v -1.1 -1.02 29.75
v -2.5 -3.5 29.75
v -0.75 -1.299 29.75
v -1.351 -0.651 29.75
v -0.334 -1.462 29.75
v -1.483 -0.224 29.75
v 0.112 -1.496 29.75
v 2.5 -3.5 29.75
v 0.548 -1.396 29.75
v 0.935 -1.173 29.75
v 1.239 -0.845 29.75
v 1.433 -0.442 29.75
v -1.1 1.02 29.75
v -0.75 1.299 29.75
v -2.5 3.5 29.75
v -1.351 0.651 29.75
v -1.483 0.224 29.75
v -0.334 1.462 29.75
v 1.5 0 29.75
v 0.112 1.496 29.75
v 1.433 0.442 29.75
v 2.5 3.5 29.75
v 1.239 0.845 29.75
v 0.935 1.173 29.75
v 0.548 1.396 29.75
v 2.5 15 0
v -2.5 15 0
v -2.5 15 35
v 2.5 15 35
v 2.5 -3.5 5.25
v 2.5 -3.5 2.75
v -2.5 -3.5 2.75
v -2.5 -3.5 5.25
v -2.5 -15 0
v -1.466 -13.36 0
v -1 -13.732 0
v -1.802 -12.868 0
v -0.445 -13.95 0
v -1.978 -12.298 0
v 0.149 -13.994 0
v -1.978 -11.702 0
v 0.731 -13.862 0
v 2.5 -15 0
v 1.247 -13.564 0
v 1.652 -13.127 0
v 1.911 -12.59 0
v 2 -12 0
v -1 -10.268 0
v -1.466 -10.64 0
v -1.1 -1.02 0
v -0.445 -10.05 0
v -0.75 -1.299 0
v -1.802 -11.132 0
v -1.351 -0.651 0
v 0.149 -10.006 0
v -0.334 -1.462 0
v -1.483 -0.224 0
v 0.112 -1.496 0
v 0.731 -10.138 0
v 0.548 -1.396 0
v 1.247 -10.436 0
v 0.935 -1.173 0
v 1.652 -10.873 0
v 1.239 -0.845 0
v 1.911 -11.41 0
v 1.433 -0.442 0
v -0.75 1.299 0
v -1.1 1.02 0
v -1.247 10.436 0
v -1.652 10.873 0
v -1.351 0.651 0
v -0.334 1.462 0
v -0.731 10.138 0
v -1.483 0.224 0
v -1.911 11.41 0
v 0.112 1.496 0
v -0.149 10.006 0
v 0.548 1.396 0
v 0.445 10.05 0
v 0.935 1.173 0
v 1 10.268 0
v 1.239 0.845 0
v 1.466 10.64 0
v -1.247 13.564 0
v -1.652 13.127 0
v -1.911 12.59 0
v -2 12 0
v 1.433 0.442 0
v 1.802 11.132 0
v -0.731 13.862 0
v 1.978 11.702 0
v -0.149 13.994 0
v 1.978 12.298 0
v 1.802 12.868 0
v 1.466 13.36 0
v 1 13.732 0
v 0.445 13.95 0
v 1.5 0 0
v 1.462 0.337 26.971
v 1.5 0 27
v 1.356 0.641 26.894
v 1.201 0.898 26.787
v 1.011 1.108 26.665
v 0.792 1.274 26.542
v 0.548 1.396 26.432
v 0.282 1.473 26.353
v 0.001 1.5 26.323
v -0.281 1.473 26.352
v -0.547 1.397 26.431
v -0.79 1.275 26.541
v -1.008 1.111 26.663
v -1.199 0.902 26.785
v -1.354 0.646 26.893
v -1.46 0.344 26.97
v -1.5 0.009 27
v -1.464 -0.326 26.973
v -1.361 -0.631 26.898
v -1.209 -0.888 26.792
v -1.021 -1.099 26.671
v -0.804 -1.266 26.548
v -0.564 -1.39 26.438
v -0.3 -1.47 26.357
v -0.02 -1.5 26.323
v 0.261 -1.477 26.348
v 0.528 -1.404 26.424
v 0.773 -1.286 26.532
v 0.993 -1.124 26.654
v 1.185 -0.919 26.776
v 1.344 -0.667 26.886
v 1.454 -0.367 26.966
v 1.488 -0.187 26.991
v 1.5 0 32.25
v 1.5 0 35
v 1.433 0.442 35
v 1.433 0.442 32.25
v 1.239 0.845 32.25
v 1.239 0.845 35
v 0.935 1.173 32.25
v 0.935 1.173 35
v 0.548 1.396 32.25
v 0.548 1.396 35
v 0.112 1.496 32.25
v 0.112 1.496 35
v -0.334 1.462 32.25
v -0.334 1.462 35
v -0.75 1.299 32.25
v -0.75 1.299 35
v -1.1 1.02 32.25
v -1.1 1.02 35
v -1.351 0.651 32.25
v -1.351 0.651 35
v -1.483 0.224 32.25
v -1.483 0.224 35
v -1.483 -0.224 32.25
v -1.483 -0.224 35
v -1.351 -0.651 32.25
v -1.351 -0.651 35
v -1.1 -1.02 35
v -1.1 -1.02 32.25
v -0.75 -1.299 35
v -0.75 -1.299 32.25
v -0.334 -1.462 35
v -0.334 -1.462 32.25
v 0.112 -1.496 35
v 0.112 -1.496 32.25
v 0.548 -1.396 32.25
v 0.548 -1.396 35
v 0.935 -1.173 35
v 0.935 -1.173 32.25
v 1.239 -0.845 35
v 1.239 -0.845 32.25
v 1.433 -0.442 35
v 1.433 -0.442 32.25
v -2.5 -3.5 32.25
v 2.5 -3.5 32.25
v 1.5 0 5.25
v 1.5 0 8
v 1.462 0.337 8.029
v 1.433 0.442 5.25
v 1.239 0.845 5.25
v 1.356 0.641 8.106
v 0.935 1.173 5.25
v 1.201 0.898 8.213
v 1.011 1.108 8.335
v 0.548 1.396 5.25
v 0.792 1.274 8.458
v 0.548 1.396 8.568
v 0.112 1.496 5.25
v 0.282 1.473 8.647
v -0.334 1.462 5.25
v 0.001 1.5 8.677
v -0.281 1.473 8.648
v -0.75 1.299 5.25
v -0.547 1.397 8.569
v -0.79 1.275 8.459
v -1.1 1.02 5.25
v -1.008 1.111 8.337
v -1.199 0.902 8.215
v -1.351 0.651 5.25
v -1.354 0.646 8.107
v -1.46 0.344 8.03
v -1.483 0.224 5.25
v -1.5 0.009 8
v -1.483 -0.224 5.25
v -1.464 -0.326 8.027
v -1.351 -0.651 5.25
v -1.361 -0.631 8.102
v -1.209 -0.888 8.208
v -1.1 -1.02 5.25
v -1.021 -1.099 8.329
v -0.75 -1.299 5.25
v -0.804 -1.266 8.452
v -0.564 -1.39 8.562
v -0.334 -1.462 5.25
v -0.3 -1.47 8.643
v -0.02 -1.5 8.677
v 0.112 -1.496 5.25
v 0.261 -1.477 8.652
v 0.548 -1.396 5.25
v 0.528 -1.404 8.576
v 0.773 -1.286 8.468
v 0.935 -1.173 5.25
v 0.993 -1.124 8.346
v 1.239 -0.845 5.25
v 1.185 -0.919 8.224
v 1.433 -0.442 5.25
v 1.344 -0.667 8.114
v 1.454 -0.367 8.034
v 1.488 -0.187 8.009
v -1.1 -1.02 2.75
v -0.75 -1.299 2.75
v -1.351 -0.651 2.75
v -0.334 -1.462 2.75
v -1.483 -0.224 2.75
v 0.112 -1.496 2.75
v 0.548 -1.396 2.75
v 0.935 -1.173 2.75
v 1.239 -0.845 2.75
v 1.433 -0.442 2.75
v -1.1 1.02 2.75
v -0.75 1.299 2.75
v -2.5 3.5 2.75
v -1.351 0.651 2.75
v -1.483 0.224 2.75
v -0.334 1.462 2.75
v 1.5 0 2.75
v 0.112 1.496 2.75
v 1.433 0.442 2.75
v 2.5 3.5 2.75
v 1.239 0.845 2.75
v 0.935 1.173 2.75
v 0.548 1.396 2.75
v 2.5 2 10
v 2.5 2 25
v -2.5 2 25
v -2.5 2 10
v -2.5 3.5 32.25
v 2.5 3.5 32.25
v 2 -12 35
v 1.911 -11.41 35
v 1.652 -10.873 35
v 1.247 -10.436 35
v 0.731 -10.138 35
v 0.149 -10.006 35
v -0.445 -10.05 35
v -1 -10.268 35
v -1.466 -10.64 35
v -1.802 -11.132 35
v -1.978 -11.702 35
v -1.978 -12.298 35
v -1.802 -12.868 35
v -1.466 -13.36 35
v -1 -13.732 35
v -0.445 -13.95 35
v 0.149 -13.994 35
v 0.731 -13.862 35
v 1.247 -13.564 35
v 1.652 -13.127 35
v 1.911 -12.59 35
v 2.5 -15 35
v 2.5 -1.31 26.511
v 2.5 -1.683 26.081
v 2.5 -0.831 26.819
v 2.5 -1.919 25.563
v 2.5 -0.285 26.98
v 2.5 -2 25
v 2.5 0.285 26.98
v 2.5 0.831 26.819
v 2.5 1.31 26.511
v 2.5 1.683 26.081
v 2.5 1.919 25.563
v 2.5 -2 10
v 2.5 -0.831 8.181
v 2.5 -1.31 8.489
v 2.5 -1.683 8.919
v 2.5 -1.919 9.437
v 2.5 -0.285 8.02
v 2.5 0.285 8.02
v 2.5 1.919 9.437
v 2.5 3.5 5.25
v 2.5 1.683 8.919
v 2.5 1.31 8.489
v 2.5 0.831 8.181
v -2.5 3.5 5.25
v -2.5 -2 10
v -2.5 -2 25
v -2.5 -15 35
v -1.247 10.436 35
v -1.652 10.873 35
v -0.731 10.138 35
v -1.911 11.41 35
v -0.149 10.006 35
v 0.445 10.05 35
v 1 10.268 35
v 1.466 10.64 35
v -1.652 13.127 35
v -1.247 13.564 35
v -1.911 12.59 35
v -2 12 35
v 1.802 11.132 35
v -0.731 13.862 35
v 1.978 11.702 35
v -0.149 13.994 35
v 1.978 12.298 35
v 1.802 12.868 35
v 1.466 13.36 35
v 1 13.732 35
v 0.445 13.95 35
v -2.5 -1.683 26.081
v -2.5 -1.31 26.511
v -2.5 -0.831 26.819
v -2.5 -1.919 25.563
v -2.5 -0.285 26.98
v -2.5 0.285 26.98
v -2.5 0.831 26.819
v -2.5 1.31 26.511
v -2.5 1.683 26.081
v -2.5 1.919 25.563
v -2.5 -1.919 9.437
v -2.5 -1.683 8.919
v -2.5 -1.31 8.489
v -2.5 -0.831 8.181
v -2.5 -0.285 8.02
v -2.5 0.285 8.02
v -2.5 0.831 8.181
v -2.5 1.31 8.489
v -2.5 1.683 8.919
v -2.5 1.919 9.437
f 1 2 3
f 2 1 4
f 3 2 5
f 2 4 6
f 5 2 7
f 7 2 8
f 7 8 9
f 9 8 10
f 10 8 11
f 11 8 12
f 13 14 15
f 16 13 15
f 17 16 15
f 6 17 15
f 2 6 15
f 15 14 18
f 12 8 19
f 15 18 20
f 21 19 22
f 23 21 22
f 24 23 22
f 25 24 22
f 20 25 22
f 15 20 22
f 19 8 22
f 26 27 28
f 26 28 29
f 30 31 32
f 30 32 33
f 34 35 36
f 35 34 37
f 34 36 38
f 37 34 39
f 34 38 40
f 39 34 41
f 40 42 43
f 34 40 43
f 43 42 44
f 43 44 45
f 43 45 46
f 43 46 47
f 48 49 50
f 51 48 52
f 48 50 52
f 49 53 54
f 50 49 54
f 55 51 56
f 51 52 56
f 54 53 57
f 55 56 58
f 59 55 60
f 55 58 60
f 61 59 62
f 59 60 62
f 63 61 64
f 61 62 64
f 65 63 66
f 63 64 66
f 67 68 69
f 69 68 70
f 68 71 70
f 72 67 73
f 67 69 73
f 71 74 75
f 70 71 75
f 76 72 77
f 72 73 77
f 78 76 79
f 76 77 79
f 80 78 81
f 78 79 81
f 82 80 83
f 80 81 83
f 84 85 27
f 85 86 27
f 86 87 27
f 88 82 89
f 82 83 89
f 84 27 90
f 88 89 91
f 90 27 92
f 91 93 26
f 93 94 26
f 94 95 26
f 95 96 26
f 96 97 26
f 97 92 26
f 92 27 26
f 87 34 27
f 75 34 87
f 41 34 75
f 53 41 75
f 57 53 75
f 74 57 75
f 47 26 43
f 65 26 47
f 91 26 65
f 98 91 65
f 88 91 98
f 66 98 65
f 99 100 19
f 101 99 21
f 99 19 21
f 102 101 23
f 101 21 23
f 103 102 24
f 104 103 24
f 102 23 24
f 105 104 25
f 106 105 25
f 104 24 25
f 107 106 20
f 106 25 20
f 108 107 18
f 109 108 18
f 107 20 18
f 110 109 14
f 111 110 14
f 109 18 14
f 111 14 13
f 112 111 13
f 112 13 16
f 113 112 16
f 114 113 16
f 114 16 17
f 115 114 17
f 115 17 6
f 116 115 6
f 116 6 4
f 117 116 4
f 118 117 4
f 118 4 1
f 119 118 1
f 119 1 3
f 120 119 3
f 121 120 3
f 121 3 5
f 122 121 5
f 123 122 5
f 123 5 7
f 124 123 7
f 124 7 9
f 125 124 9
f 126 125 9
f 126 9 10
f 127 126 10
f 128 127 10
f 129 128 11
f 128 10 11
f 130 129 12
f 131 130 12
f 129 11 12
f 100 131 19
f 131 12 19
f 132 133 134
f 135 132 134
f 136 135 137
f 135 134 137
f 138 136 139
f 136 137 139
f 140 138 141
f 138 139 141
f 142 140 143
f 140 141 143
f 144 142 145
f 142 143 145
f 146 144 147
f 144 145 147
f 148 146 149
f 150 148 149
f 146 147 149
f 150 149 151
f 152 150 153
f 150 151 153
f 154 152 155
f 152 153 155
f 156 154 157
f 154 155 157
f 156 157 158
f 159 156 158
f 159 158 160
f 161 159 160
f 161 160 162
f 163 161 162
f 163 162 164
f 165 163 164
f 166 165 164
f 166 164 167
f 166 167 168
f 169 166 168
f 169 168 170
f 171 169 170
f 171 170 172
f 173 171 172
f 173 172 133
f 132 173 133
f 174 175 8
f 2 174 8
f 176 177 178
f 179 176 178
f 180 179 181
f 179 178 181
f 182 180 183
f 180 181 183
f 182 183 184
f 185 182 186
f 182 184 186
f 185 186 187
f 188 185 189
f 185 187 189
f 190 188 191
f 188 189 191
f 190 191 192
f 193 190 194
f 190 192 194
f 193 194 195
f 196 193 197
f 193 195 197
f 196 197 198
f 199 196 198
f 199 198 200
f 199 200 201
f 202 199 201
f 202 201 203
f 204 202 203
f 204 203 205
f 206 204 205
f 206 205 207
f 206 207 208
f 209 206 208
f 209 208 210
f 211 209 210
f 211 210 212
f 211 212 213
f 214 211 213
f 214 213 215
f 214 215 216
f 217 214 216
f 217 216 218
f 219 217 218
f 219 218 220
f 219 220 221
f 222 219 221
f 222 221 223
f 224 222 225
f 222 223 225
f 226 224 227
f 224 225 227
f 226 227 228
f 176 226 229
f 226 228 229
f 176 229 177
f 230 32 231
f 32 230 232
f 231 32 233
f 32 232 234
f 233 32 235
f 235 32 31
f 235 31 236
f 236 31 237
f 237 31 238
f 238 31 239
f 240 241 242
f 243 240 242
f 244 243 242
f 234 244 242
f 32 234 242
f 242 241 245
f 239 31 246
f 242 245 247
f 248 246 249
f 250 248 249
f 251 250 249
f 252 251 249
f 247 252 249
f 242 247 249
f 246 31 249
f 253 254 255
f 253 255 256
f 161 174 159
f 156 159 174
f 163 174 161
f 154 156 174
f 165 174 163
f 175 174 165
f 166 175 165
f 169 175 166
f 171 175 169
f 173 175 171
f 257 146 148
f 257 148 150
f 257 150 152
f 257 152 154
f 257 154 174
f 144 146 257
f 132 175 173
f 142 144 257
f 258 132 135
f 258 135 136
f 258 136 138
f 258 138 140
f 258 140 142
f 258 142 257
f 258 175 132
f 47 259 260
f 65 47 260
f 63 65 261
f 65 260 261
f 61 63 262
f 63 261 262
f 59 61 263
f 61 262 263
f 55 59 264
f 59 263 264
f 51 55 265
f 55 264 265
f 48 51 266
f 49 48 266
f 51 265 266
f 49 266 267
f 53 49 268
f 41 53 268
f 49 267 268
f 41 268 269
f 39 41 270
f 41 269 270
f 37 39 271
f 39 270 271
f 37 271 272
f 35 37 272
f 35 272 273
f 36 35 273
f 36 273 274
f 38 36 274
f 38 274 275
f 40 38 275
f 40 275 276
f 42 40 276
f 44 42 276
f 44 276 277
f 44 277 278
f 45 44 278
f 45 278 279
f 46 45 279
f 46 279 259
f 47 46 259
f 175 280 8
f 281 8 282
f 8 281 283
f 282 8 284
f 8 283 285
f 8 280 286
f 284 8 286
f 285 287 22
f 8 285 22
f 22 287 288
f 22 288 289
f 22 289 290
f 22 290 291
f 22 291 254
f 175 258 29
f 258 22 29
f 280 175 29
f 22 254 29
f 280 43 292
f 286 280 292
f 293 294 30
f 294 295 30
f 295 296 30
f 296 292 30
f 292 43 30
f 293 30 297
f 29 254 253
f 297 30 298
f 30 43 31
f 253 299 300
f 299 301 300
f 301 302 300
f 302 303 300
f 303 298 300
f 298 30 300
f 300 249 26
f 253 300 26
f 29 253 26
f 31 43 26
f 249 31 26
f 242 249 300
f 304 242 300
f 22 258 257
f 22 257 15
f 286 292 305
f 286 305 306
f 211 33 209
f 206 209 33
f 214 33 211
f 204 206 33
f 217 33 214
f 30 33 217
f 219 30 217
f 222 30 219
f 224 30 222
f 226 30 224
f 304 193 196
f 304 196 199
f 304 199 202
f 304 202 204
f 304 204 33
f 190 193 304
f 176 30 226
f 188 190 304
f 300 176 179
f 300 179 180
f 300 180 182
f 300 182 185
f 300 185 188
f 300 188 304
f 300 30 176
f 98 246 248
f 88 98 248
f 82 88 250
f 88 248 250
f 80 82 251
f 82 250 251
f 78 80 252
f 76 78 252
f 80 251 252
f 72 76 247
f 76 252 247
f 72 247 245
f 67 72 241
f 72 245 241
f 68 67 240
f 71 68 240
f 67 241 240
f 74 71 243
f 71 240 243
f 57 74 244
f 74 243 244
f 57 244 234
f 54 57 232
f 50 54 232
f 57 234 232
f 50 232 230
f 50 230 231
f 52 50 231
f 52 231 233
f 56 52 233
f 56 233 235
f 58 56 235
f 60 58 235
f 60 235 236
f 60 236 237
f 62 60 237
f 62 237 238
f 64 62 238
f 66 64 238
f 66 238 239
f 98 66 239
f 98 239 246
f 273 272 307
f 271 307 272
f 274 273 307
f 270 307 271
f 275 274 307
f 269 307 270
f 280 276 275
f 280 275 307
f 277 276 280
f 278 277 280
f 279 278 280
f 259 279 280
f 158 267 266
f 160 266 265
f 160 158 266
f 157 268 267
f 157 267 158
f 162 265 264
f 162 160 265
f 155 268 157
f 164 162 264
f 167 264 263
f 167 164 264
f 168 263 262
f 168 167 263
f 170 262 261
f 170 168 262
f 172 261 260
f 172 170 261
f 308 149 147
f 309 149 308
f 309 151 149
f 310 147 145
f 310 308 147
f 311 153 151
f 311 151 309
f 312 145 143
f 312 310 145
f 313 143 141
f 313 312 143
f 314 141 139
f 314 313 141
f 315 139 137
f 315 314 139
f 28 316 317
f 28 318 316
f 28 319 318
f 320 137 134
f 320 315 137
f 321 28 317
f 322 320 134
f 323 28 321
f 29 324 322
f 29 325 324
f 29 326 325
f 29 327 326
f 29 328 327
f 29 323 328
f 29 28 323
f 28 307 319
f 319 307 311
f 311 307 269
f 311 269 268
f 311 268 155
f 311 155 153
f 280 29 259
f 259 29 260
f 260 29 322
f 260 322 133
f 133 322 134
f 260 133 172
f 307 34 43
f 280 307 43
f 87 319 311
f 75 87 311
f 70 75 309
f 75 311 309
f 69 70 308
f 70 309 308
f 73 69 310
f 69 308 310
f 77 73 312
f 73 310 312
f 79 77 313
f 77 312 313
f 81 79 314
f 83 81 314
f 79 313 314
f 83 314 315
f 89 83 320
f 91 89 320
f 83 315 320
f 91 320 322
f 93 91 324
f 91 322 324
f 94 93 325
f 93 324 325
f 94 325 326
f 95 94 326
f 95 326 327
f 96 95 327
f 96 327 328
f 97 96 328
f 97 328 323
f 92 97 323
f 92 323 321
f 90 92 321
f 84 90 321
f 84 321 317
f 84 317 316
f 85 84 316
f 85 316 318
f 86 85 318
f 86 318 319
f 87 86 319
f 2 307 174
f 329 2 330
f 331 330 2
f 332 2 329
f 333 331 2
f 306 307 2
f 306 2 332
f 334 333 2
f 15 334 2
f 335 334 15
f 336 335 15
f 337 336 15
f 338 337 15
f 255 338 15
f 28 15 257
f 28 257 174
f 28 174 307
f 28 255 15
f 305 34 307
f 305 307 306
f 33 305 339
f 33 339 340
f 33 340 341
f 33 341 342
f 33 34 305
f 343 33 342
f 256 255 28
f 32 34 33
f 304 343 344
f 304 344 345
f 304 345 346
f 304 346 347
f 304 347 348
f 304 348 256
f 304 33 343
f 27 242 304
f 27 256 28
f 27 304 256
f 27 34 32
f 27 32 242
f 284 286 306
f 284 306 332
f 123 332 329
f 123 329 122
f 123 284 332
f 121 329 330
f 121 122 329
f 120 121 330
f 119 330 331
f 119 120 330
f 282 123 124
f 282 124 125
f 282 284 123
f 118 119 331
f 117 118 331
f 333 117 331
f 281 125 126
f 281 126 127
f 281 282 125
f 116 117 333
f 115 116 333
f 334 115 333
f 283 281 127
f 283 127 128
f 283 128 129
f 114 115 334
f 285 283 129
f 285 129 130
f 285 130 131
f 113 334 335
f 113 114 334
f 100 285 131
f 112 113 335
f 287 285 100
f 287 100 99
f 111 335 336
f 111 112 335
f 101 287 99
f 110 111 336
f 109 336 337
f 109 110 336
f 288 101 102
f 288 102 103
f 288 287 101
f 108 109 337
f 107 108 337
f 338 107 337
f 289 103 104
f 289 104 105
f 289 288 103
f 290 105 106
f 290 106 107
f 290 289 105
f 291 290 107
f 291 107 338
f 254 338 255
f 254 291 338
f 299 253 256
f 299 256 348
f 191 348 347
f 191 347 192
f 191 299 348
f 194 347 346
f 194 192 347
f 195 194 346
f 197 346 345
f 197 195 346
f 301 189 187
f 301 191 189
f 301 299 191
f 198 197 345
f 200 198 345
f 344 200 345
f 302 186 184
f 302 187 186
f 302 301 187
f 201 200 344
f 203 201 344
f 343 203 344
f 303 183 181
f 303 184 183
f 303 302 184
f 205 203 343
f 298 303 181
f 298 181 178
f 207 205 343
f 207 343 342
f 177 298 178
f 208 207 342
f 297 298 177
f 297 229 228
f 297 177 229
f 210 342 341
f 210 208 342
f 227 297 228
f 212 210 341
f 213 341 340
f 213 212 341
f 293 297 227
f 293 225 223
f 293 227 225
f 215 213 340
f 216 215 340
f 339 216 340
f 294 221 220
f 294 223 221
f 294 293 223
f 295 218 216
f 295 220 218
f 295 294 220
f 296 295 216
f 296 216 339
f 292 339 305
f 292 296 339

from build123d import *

# Parameters (mm, degrees)
ESQUISSE1_W             = 5
ESQUISSE1_H             = 30
BOSS_EXTRU_1_DEPTH      = 35
ENL_V_MAT_EXTRU_1_DEPTH = 39.405728739
ESQUISSE3_R             = 1.5
ESQUISSE3_R_2           = 2
ENL_V_MAT_EXTRU_2_DEPTH = 40
ESQUISSE4_W             = 2.5
ESQUISSE4_H             = 7
ENL_V_MAT_EXTRU_3_DEPTH = 10


with BuildPart() as part:
    # Esquisse1 → Boss.-Extru.1 (new body)
    with BuildSketch(Plane.XY):
        Rectangle(ESQUISSE1_W, ESQUISSE1_H)
    extrude(amount=BOSS_EXTRU_1_DEPTH)

    # Esquisse2 → Enlèv. mat.-Extru.1 (cut, through all)
    with BuildSketch(Plane(origin=(2.5, 0, 0), x_dir=(0, 0, -1), z_dir=(1, 0, 0))):
        with BuildLine():
            Line((-10, -2), (-25, -2))
            ThreePointArc((-25, -2), (-27, 0), (-25, 2))
            Line((-25, 2), (-10, 2))
            ThreePointArc((-10, 2), (-8, 0), (-10, -2))
        make_face()
    extrude(amount=-ENL_V_MAT_EXTRU_1_DEPTH, mode=Mode.SUBTRACT)

    # Esquisse3 → Enlèv. mat.-Extru.2 (cut)
    with BuildSketch(Plane.XY.offset(35)):
        Circle(ESQUISSE3_R)
        with Locations((0, -12)):
            Circle(ESQUISSE3_R_2)
        with Locations(Location((0, 12, 0), (0, 0, 180))):
            Circle(ESQUISSE3_R_2)
    extrude(amount=-ENL_V_MAT_EXTRU_2_DEPTH, mode=Mode.SUBTRACT)

    # Esquisse4 → Enlèv. mat.-Extru.3 (cut)
    with BuildSketch(Plane(origin=(2.5, 0, 0), x_dir=(0, 0, -1), z_dir=(1, 0, 0))):
        with Locations((-31, 0)):
            Rectangle(ESQUISSE4_W, ESQUISSE4_H)
    enl_v_mat_extru_3 = extrude(amount=-ENL_V_MAT_EXTRU_3_DEPTH, mode=Mode.SUBTRACT)

    # Symétrie1: Enlèv. mat.-Extru.3 across plane
    add(enl_v_mat_extru_3.mirror(Plane.XY.offset(17.5)), mode=Mode.SUBTRACT)


solid = part.part
